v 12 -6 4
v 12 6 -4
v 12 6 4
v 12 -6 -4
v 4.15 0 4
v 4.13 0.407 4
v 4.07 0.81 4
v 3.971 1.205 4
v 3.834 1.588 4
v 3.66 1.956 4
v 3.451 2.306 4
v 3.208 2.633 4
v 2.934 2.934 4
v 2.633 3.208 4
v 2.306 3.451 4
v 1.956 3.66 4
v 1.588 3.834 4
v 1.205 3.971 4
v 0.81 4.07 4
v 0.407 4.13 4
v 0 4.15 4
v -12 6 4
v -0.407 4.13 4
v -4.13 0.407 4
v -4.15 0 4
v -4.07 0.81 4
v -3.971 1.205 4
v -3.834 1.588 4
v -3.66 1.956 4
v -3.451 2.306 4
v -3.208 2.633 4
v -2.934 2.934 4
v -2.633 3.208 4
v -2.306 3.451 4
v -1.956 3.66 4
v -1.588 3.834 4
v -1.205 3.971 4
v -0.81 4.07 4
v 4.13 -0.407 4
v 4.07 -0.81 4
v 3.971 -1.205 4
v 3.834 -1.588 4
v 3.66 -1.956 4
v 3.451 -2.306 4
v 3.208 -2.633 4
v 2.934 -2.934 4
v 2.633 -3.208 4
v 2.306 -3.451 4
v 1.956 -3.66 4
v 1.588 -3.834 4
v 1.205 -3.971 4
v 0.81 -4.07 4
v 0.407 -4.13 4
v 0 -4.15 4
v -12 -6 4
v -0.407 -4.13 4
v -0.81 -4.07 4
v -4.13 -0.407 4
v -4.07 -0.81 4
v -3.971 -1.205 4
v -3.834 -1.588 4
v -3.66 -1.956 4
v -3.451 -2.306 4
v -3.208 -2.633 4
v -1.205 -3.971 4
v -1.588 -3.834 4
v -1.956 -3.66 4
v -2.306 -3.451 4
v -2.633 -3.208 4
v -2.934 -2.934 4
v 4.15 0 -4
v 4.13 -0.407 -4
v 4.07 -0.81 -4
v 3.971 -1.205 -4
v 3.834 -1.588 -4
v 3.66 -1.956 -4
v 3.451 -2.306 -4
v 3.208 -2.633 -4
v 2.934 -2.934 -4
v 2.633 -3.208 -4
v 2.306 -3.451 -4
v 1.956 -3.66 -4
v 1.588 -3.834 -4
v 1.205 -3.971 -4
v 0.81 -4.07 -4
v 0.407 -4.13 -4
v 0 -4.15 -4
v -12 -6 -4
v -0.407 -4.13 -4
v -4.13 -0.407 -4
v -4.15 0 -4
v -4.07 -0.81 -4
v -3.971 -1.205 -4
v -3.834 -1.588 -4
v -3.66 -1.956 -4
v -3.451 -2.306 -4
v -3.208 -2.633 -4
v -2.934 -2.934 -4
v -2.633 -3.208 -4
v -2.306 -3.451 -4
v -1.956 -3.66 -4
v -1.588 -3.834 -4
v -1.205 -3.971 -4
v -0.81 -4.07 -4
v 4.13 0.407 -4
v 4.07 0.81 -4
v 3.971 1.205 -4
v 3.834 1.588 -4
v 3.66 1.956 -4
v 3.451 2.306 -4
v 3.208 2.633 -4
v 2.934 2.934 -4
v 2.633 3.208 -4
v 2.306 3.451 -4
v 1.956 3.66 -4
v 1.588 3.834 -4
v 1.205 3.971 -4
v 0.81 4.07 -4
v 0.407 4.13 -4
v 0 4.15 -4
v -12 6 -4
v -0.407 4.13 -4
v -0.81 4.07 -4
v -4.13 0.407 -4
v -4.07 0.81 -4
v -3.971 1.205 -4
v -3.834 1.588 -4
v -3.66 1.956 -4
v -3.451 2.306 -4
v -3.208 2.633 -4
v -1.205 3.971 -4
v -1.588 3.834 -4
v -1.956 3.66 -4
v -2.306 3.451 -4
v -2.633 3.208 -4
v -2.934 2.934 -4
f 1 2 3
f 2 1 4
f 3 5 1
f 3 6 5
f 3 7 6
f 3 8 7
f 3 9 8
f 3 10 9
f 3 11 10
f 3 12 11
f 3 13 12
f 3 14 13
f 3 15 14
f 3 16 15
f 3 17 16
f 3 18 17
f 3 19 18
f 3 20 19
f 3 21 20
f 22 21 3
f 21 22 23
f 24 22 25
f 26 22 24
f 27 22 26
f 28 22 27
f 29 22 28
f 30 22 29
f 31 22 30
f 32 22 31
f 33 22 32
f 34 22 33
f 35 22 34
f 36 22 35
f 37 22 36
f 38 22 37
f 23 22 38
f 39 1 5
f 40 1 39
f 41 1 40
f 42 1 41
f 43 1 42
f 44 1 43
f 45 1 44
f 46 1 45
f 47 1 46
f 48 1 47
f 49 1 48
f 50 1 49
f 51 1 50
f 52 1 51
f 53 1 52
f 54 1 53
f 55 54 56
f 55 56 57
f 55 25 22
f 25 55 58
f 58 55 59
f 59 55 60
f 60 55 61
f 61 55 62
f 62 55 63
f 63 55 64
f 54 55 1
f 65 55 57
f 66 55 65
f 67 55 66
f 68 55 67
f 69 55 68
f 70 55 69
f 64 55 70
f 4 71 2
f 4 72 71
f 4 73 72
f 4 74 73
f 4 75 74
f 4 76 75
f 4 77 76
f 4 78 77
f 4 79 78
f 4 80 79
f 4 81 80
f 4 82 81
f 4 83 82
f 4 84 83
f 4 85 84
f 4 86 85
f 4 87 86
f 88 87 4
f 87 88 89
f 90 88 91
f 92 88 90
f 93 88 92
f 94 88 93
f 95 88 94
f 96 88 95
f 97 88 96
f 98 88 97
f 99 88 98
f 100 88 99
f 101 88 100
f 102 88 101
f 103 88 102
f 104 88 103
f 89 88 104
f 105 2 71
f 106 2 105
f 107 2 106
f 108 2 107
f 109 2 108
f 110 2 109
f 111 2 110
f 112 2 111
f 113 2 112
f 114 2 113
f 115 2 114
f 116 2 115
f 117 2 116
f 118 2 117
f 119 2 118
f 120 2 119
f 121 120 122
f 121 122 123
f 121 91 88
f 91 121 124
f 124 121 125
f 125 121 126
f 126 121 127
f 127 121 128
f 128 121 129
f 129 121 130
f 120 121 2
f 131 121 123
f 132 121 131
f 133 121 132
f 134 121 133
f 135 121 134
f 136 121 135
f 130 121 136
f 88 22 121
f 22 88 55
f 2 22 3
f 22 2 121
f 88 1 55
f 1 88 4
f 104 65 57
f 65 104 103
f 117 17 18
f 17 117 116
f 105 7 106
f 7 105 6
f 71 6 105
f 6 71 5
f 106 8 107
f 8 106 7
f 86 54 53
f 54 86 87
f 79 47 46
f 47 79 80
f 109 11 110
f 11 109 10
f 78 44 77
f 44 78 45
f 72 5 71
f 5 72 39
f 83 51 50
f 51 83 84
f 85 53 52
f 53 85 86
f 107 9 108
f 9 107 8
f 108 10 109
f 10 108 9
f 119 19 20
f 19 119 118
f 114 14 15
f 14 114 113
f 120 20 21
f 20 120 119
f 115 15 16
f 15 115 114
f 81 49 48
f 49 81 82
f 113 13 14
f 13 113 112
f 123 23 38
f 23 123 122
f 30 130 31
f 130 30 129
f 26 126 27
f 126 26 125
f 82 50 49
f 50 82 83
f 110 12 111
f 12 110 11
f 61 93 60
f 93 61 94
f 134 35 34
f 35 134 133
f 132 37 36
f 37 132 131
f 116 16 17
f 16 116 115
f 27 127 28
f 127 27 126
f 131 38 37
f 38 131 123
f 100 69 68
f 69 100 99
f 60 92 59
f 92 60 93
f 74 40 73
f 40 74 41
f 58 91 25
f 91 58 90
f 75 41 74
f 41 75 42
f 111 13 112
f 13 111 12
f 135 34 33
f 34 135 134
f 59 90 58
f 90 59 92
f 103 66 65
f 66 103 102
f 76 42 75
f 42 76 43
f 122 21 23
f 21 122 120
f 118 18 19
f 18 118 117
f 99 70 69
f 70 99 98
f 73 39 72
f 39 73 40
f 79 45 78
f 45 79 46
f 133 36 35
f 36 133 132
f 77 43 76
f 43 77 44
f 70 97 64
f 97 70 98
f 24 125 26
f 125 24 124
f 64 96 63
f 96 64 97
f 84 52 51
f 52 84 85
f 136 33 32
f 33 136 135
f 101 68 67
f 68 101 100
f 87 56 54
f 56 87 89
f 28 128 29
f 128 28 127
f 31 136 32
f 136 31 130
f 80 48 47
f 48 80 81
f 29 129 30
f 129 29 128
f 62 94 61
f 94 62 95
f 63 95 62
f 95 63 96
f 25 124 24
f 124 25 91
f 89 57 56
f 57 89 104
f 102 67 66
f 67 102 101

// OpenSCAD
// Parametric Source File for: drive axle pins
// Generated via Sol-5.6-Max-PyOrch CAD Agent
// Component ID: COMP-480DDD
// Material hint: PETG | Mechanical profile: load-bearing
// Suggested wall_loops from DFM: 5

$fn = 64; // Render resolution
hole_compensation = 0.15; // Dynamic FDM printer gap adjustment

body_w = 24.0;
body_d = 12.0;
body_h = 8.0;
bore_r = 4.0;

module generate_drive_axle_pins_model() {
    difference() {
        // Core structural bounding hull (parametric)
        cube([body_w, body_d, body_h], center = true);

        // Dynamic interlocking peg / clearance track
        translate([0, 0, 0])
            cylinder(h = body_h + 2, r = bore_r + hole_compensation, center = true);
    }
}

generate_drive_axle_pins_model();
